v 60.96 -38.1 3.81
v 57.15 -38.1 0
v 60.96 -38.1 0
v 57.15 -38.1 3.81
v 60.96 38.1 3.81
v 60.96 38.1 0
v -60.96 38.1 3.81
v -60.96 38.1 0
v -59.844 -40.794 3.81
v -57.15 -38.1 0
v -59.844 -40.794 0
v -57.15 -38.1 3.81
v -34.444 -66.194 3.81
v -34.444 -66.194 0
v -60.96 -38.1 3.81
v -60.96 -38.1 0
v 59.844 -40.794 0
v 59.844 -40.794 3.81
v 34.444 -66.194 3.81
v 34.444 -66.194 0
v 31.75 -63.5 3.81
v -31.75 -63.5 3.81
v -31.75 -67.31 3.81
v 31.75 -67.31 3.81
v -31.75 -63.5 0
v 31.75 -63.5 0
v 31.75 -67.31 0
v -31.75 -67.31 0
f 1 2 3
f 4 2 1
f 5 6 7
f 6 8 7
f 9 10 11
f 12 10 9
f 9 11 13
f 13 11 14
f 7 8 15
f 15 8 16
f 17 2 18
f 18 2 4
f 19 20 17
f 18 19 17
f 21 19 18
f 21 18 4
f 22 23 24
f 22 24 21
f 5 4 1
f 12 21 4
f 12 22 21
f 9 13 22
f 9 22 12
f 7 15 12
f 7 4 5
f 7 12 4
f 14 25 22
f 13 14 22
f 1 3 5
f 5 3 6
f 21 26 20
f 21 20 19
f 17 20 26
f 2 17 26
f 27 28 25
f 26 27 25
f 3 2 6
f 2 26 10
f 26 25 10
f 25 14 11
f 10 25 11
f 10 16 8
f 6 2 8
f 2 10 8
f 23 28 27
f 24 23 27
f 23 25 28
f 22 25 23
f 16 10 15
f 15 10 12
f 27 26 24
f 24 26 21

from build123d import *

# Parameters (mm, degrees)
F1_DEPTH = 3.81
F2_DEPTH = 3.81
F3_DEPTH = 3.81
F4_DEPTH = 3.81
F5_DEPTH = 3.81
F6_DEPTH = 3.81


with BuildPart() as f1:
    # F0 (on Top) → F1 (new body)
    with BuildSketch(Plane.XY):
        Polygon((57.15, -38.1), (57.15, 38.1), (-57.15, 38.1), (-57.15, -38.1), (-31.75, -63.5), (0, -63.5), (31.75, -63.5), align=None)
    extrude(amount=F1_DEPTH)

    # F2 (add): a face of the model
    f2_faces = [f1.faces().sort_by_distance(p)[0] for p in [
        (0, -63.5, 1.905),
    ]]
    extrude(f2_faces, amount=F2_DEPTH)

    # F3 (add): a face of the model
    f3_faces = [f1.faces().sort_by_distance(p)[0] for p in [
        (44.45, -50.8, 1.905),
    ]]
    extrude(f3_faces, amount=F3_DEPTH)

    # F4 (add): a face of the model
    f4_faces = [f1.faces().sort_by_distance(p)[0] for p in [
        (-44.45, -50.8, 1.905),
    ]]
    extrude(f4_faces, amount=F4_DEPTH)

    # F5 (add): a face of the model
    f5_faces = [f1.faces().sort_by_distance(p)[0] for p in [
        (-57.15, 0, 1.905),
    ]]
    extrude(f5_faces, amount=F5_DEPTH)

    # F6 (add): a face of the model
    f6_faces = [f1.faces().sort_by_distance(p)[0] for p in [
        (57.15, 0, 1.905),
    ]]
    extrude(f6_faces, amount=F6_DEPTH)


solid = f1.part
